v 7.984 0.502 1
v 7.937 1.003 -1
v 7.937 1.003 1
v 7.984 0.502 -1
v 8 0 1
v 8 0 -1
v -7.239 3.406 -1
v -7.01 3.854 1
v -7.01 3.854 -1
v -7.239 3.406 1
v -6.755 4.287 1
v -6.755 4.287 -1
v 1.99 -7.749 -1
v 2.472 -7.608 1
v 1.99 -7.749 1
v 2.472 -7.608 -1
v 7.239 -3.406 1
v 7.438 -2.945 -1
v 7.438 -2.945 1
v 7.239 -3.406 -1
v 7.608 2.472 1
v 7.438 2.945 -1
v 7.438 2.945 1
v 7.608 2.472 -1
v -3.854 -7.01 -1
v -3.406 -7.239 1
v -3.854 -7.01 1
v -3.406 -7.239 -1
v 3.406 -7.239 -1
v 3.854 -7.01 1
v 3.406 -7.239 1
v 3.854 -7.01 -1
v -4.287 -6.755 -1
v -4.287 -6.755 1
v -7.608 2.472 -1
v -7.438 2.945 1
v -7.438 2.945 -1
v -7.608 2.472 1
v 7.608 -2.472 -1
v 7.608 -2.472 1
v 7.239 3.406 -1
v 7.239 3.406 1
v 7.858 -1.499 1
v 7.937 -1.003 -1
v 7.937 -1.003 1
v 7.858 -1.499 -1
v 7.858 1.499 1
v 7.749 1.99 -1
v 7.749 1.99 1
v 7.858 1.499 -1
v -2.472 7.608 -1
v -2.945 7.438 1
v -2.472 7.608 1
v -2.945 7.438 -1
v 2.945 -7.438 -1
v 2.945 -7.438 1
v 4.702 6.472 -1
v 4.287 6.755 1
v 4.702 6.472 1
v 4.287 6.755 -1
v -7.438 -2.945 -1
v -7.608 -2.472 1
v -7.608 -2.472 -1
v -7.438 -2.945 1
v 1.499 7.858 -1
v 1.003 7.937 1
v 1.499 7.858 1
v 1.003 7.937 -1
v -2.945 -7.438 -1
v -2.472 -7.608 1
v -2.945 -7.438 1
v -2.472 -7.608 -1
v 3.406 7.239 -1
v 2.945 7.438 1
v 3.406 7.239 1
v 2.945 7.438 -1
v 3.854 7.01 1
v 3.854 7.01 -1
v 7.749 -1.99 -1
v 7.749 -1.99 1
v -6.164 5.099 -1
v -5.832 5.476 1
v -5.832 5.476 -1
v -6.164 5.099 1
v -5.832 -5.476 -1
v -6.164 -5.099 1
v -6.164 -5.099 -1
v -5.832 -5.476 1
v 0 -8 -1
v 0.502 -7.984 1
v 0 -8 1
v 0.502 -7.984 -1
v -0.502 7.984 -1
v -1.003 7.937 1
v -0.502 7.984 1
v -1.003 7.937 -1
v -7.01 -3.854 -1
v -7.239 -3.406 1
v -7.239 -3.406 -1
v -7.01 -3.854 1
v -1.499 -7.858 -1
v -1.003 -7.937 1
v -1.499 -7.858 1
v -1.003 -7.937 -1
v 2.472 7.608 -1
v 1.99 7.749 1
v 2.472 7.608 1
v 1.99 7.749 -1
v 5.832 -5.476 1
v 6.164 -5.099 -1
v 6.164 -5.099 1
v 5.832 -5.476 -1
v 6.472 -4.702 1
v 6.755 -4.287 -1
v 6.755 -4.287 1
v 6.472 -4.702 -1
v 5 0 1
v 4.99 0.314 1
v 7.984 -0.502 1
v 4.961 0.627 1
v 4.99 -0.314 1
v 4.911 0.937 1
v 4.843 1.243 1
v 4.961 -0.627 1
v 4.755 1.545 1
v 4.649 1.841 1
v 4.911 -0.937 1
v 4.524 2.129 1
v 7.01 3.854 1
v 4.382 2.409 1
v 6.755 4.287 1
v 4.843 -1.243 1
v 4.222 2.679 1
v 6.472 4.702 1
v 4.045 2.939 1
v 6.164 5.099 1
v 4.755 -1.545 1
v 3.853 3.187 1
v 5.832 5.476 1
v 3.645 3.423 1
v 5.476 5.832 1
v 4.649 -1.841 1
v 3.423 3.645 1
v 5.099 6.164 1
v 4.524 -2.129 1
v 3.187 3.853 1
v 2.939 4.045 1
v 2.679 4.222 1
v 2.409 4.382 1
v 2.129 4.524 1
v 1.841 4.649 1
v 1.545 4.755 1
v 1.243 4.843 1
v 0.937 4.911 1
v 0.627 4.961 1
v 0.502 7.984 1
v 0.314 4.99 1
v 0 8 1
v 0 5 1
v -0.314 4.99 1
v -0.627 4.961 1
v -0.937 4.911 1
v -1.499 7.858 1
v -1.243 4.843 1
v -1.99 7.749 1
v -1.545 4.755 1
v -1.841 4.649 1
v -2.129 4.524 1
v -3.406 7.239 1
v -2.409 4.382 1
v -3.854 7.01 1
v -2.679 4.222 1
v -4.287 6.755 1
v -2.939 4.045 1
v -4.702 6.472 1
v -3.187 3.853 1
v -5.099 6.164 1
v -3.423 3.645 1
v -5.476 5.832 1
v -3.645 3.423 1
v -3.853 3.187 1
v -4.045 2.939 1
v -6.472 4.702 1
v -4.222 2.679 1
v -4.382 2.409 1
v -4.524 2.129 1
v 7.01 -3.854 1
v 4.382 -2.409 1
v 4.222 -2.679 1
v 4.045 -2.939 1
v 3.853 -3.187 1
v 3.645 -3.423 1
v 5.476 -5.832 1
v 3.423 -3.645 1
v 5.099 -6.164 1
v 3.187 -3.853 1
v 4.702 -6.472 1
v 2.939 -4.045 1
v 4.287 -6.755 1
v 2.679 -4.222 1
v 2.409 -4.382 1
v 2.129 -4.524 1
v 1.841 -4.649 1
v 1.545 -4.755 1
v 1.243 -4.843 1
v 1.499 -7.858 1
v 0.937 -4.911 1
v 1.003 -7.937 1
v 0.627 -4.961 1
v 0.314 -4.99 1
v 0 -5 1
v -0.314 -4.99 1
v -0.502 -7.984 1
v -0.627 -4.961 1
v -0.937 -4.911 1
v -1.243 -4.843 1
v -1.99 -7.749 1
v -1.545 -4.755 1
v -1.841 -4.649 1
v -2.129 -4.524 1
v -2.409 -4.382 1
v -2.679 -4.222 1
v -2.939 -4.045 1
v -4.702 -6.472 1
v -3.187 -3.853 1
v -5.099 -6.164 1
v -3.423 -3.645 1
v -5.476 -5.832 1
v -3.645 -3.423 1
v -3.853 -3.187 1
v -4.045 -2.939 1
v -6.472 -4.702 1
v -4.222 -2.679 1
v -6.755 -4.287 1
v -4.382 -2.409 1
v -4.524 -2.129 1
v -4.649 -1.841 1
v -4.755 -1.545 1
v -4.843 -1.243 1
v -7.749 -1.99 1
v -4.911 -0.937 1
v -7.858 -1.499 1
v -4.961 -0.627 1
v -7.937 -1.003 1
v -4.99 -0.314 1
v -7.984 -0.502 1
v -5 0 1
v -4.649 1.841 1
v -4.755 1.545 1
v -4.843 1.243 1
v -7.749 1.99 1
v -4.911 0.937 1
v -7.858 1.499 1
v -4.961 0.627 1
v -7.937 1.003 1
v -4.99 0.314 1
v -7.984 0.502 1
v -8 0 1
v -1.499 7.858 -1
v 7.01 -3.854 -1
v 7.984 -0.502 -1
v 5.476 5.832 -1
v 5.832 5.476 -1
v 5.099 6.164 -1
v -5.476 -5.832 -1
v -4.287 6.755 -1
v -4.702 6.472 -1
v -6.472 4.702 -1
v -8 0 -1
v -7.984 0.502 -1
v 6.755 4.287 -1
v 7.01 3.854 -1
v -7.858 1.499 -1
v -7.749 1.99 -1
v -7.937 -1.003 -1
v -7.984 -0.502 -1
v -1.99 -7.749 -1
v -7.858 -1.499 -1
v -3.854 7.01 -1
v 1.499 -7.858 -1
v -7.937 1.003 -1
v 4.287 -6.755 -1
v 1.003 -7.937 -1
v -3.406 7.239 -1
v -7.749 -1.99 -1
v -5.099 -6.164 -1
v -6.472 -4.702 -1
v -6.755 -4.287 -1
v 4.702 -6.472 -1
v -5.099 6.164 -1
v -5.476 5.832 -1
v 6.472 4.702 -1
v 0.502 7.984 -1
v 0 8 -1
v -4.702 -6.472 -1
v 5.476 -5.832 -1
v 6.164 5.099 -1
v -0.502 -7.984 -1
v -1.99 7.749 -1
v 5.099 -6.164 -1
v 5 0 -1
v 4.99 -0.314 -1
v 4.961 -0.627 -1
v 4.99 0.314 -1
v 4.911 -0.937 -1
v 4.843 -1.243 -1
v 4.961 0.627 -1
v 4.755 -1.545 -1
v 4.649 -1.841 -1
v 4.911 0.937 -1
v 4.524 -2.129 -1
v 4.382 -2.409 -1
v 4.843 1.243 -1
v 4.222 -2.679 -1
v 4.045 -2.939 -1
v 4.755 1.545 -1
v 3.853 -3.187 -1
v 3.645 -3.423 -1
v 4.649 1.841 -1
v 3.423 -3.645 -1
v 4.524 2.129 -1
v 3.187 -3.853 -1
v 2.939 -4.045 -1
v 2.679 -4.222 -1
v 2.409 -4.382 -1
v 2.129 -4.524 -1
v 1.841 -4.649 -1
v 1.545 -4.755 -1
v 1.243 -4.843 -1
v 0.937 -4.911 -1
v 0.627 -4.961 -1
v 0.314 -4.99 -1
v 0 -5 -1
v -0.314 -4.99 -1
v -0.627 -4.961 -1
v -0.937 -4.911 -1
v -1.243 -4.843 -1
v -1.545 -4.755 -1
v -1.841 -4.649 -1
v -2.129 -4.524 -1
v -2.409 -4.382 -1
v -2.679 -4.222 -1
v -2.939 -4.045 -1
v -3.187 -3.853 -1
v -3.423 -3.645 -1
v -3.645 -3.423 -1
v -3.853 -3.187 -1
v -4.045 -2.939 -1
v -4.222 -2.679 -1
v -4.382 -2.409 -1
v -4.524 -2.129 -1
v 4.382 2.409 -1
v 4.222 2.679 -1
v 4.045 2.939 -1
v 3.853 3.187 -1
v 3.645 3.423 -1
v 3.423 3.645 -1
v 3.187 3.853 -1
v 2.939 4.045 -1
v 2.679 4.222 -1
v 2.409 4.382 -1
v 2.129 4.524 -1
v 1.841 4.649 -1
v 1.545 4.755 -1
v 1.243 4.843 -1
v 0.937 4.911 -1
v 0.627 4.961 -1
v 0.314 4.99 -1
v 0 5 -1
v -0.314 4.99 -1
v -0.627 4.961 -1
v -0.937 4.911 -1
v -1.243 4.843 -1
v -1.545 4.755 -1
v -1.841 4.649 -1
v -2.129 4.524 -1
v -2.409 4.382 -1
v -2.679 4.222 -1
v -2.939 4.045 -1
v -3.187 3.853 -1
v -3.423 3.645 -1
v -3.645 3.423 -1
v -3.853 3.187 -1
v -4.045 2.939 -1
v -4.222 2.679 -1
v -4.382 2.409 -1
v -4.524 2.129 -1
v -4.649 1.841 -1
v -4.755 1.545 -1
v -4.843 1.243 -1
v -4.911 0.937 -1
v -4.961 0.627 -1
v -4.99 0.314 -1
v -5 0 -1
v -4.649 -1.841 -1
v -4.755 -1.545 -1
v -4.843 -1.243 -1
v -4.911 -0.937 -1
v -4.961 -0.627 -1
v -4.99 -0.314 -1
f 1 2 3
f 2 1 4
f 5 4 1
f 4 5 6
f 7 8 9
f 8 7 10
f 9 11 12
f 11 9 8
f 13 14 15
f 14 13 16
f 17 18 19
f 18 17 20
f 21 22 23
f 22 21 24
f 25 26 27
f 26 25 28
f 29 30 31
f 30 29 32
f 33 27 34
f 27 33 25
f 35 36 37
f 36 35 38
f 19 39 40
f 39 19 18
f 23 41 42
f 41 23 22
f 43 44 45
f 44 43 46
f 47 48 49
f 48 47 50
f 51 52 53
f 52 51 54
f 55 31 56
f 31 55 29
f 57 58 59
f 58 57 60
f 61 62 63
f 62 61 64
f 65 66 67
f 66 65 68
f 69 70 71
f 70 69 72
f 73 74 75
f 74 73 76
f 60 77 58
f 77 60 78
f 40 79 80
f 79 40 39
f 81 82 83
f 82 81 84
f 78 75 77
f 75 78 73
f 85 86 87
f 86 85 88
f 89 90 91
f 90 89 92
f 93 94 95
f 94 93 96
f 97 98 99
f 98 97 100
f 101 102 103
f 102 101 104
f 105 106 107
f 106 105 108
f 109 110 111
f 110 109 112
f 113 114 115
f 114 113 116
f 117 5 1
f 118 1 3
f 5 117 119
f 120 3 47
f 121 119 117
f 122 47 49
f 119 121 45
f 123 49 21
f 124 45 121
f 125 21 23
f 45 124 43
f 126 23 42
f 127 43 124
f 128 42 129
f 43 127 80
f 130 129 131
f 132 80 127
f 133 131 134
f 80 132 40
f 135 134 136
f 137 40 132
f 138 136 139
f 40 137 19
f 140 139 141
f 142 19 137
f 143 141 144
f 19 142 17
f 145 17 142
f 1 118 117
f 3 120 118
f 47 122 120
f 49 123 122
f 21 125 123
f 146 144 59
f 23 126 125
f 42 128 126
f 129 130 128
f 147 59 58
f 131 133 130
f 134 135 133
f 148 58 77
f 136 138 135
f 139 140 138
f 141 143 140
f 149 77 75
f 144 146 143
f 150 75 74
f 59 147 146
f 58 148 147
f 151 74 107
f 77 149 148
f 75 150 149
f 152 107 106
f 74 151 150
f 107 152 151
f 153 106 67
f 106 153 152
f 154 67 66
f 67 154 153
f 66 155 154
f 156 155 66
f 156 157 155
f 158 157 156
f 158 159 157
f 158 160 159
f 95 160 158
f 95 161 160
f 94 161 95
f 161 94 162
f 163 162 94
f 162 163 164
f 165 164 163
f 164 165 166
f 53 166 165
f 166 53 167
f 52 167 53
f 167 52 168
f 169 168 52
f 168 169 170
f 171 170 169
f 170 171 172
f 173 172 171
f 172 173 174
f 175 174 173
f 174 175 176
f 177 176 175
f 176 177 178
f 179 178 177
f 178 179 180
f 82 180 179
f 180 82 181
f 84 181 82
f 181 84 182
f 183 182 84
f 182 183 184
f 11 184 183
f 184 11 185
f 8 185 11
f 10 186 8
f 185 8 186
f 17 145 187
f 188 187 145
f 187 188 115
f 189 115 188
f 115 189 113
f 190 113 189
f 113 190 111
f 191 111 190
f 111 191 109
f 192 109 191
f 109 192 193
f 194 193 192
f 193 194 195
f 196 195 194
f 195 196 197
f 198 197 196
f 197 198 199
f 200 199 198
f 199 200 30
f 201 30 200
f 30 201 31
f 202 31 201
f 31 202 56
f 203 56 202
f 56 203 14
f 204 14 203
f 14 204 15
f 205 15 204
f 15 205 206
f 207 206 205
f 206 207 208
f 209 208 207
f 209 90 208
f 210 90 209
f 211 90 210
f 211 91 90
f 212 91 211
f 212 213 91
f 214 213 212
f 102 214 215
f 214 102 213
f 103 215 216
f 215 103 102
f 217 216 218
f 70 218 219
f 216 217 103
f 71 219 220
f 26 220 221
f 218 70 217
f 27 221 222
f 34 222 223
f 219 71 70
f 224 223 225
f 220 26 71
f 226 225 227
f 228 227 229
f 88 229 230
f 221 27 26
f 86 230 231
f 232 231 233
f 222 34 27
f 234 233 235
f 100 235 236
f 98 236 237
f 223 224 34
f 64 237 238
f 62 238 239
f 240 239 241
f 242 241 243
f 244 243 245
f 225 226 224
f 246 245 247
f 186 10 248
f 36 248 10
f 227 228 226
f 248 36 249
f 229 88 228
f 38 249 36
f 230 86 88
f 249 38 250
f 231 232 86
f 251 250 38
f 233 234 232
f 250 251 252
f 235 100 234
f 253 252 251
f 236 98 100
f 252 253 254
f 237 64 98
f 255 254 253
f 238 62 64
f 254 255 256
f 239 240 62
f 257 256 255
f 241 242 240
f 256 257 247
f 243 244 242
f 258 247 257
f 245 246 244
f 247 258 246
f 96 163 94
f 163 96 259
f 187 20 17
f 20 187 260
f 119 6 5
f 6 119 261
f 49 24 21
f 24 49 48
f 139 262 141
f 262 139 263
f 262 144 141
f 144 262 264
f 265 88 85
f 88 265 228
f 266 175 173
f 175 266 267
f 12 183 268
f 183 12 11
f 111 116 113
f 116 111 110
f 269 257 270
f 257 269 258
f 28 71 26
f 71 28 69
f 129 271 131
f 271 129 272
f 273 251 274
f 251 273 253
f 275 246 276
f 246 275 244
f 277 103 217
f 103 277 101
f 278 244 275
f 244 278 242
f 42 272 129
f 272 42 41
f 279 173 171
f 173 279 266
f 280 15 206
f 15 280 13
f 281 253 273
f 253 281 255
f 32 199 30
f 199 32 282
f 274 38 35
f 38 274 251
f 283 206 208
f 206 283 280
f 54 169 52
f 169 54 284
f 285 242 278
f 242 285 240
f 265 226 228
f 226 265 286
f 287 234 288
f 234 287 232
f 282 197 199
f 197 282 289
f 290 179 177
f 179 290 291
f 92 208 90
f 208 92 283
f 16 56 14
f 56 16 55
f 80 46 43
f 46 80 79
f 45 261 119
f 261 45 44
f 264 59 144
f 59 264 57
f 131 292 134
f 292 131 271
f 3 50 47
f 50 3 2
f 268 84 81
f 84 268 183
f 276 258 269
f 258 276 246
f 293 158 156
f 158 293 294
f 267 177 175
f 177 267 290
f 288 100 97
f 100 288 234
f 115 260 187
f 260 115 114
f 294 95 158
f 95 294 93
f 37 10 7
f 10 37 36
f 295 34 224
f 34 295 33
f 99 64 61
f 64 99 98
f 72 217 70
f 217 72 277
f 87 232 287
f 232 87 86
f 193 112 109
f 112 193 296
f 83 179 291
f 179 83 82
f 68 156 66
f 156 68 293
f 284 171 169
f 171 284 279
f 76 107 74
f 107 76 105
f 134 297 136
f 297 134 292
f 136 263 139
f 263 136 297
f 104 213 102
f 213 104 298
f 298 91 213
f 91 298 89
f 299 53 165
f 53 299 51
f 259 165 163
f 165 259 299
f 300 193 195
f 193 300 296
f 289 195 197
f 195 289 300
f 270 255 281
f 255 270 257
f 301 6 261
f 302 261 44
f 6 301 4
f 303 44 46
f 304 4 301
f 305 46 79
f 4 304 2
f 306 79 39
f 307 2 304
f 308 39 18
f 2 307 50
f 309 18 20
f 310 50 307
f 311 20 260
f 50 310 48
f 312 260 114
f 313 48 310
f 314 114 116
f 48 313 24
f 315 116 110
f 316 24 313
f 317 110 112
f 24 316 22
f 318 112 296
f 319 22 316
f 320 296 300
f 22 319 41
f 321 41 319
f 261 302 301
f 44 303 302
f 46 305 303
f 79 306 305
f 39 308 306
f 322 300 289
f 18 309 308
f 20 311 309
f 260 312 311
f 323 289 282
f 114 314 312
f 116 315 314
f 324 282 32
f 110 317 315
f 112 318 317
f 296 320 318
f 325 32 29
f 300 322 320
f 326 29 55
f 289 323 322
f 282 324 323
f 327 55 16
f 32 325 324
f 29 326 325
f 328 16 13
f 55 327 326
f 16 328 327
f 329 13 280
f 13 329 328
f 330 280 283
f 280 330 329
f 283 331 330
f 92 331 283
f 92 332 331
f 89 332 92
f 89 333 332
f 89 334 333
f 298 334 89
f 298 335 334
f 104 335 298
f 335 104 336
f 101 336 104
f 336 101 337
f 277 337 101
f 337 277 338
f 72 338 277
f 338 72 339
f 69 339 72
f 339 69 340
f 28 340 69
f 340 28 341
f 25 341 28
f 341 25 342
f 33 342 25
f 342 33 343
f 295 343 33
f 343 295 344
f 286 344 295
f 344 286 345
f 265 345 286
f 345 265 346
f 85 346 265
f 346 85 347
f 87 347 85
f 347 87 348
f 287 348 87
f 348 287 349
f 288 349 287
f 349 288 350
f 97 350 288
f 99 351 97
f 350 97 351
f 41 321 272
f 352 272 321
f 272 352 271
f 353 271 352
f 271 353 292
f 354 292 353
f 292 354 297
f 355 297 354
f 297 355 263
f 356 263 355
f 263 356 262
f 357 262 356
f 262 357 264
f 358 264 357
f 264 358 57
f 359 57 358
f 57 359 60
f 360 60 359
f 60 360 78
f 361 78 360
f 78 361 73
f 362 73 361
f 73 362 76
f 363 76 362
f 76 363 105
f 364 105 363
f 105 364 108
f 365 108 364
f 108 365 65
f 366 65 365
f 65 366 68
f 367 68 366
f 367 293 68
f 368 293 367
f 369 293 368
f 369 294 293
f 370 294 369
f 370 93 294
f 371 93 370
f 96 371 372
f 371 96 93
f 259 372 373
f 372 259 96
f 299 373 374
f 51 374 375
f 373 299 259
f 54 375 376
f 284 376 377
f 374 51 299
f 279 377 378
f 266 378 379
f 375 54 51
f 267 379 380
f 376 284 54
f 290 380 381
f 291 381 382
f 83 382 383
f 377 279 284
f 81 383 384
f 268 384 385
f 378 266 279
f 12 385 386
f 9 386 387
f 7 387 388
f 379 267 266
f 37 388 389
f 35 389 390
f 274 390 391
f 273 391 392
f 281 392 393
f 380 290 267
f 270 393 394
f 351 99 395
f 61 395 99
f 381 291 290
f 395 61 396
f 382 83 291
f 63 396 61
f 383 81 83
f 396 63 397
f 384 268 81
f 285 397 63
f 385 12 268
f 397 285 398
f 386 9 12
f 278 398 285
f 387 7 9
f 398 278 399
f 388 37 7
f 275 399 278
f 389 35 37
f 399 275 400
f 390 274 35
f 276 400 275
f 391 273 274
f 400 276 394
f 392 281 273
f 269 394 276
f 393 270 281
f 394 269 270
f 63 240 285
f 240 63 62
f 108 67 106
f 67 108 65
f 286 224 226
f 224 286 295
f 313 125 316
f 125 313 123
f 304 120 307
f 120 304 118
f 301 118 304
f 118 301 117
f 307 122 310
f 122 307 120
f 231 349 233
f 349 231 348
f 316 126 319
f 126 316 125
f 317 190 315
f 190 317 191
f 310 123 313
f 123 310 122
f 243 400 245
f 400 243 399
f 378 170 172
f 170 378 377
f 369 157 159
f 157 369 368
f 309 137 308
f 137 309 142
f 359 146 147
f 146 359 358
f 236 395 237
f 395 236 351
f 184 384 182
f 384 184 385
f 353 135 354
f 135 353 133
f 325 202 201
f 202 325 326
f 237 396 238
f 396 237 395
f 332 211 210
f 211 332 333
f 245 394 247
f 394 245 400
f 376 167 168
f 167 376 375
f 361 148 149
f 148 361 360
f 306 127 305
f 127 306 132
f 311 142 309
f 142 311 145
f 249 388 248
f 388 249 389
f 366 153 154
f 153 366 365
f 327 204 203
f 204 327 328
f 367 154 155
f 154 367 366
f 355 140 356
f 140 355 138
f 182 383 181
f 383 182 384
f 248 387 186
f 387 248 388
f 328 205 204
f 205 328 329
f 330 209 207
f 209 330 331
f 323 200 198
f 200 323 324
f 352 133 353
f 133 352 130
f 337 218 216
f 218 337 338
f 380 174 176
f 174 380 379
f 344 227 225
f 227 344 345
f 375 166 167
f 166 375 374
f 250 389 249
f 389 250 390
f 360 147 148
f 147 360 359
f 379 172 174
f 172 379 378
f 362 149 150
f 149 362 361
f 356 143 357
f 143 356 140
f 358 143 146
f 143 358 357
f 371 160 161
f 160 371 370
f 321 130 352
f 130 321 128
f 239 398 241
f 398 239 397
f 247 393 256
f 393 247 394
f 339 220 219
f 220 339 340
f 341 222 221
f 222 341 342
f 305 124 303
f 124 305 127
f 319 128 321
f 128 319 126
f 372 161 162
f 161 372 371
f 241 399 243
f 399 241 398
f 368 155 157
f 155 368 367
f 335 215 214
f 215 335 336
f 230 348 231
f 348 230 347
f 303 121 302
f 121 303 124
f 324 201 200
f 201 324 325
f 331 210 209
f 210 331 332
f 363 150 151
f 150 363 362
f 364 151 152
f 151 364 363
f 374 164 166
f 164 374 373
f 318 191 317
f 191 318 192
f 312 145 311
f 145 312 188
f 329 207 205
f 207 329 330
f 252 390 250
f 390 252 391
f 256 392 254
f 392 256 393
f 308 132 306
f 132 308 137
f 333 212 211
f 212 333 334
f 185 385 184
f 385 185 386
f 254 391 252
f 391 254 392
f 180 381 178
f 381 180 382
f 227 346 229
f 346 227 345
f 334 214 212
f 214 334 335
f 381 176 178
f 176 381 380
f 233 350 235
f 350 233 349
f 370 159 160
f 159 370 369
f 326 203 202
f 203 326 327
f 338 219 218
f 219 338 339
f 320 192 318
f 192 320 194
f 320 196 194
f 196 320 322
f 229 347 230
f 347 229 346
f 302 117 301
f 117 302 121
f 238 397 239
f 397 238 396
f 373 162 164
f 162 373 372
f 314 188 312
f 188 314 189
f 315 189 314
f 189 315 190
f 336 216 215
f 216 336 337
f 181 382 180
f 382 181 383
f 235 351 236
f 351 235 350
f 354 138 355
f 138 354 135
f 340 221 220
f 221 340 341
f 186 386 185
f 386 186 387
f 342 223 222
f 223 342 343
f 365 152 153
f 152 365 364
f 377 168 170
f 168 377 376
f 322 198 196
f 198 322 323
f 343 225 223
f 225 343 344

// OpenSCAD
// file: cylinder_hole.scad
module cylinder_hole(outer_r = 2, inner_r = 1, h = 1) {
  difference() {
    cylinder(r1 = outer_r, r2 = outer_r, h = h, center = true);
    cylinder(r1 = inner_r, r2 = inner_r, h = h, center = true);
  }
}
// main file
include <./cylinder_hole.scad>

$fn = 100;

cylinder_hole(inner_r = 5, outer_r = 8, h = 2);
